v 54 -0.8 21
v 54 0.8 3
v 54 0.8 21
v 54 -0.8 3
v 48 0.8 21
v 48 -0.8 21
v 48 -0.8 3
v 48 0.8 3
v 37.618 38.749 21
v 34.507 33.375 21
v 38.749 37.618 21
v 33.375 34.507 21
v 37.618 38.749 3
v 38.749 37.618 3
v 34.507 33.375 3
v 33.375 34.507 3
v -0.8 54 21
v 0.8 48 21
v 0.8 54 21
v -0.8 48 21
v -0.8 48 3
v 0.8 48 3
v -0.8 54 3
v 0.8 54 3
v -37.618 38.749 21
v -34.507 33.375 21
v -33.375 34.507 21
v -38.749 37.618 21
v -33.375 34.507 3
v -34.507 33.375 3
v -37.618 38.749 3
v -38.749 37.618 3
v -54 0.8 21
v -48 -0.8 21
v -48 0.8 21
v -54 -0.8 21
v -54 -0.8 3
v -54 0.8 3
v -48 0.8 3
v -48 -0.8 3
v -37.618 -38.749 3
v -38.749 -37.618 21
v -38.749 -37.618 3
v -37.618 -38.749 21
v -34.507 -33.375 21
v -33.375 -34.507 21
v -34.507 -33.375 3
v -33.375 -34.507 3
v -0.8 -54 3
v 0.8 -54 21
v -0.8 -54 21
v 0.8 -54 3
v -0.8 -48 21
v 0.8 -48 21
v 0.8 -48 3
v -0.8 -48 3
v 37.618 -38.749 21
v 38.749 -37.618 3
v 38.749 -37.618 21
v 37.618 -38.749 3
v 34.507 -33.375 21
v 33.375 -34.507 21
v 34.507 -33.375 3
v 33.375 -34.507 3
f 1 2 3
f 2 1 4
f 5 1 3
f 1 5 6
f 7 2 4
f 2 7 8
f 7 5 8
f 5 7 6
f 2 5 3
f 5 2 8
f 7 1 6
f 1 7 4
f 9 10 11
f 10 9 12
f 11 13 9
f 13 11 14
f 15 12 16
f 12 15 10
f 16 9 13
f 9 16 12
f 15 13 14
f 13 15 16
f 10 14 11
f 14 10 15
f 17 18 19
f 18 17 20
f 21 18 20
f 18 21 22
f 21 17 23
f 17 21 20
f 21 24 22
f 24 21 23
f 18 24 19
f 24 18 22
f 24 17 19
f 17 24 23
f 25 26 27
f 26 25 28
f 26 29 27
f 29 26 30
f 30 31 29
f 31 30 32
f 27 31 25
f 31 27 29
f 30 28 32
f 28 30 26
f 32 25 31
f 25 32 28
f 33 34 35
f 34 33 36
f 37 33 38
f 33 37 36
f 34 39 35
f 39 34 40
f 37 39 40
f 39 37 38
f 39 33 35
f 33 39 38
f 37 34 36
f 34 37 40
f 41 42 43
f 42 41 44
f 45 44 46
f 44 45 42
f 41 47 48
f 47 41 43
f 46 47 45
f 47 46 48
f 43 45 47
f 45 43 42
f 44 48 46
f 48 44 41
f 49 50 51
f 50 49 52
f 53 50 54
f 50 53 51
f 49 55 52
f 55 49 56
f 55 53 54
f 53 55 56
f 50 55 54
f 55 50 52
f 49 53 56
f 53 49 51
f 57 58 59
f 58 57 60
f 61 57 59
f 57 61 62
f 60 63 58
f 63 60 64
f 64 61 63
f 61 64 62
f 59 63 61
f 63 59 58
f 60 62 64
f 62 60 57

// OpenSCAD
// file: 55_stage1_print_parameters.scad
/* BUDDY FILE 55 - STAGE 1 PRINT / INTERFACE PARAMETERS
All dimensions mm. Values marked PROCESS are starting points for calibration coupons. */
B1_OD=115; B1_CAVITY_D=111; B1_AIRWAY_D=70; B1_DUCT_OD=74;
B1_SHELL_R=B1_OD/2; B1_CAVITY_R=B1_CAVITY_D/2;
B1_WALL=2.0; B1_MIN_RIB=2.2; B1_MIN_WEB=1.2;
B1_FDM_SLIDE=0.30;       // PROCESS: per side, calibrate
B1_FDM_PRESS=0.10;       // PROCESS: per side, calibrate
B1_INSERT_OD=3.2;        // PLACEHOLDER for M2-class heat-set insert; replace from selected insert drawing
B1_M2_CLEAR=2.4;         // PROCESS starting clearance
B1_M2_HEAD=4.3;          // PLACEHOLDER head pocket
B1_M2_HEAD_H=1.8;
B1_POLAR_OPENING_D=74.8;
B1_CAMERA_DUCT_GAP=0.8; B1_CAMERA_SHELL_MARGIN=1.0;
B1_ROTOR_NOMINAL_R=34.6; B1_ROTOR_STATIC_RADIAL_GAP=B1_AIRWAY_D/2-B1_ROTOR_NOMINAL_R;
assert(B1_OD==115); assert(B1_CAVITY_D==111); assert(B1_AIRWAY_D==70);
assert(B1_POLAR_OPENING_D>B1_DUCT_OD);
assert(B1_ROTOR_STATIC_RADIAL_GAP>0);
echo("FILE55 Stage1 architecture OD/cavity/airway =",B1_OD,B1_CAVITY_D,B1_AIRWAY_D);
echo("PROCESS tolerances require calibration before production prints");
// main file
/* BUDDY FILE90 - SYMMETRIC VENT / REINFORCEMENT PATTERN
Cutout tool for peripheral electronics cooling. Never cuts protected propulsion duct. */
include <55_stage1_print_parameters.scad>
$fn=72;
module vent_cutouts(){for(a=[45,135,225,315])rotate([0,0,a])translate([53,0,18])rotate([0,90,0])hull(){translate([0,-4,0])cylinder(h=5,d=3,center=true);translate([0,4,0])cylinder(h=5,d=3,center=true);}}
module reinforcement_ribs(){for(a=[0:45:315])rotate([0,0,a])translate([51,0,12])cube([6,1.6,18],center=true);}
%vent_cutouts();reinforcement_ribs();
echo("FILE90 symmetric peripheral ventilation/reinforcement concept; thermal and impact validation pending");
